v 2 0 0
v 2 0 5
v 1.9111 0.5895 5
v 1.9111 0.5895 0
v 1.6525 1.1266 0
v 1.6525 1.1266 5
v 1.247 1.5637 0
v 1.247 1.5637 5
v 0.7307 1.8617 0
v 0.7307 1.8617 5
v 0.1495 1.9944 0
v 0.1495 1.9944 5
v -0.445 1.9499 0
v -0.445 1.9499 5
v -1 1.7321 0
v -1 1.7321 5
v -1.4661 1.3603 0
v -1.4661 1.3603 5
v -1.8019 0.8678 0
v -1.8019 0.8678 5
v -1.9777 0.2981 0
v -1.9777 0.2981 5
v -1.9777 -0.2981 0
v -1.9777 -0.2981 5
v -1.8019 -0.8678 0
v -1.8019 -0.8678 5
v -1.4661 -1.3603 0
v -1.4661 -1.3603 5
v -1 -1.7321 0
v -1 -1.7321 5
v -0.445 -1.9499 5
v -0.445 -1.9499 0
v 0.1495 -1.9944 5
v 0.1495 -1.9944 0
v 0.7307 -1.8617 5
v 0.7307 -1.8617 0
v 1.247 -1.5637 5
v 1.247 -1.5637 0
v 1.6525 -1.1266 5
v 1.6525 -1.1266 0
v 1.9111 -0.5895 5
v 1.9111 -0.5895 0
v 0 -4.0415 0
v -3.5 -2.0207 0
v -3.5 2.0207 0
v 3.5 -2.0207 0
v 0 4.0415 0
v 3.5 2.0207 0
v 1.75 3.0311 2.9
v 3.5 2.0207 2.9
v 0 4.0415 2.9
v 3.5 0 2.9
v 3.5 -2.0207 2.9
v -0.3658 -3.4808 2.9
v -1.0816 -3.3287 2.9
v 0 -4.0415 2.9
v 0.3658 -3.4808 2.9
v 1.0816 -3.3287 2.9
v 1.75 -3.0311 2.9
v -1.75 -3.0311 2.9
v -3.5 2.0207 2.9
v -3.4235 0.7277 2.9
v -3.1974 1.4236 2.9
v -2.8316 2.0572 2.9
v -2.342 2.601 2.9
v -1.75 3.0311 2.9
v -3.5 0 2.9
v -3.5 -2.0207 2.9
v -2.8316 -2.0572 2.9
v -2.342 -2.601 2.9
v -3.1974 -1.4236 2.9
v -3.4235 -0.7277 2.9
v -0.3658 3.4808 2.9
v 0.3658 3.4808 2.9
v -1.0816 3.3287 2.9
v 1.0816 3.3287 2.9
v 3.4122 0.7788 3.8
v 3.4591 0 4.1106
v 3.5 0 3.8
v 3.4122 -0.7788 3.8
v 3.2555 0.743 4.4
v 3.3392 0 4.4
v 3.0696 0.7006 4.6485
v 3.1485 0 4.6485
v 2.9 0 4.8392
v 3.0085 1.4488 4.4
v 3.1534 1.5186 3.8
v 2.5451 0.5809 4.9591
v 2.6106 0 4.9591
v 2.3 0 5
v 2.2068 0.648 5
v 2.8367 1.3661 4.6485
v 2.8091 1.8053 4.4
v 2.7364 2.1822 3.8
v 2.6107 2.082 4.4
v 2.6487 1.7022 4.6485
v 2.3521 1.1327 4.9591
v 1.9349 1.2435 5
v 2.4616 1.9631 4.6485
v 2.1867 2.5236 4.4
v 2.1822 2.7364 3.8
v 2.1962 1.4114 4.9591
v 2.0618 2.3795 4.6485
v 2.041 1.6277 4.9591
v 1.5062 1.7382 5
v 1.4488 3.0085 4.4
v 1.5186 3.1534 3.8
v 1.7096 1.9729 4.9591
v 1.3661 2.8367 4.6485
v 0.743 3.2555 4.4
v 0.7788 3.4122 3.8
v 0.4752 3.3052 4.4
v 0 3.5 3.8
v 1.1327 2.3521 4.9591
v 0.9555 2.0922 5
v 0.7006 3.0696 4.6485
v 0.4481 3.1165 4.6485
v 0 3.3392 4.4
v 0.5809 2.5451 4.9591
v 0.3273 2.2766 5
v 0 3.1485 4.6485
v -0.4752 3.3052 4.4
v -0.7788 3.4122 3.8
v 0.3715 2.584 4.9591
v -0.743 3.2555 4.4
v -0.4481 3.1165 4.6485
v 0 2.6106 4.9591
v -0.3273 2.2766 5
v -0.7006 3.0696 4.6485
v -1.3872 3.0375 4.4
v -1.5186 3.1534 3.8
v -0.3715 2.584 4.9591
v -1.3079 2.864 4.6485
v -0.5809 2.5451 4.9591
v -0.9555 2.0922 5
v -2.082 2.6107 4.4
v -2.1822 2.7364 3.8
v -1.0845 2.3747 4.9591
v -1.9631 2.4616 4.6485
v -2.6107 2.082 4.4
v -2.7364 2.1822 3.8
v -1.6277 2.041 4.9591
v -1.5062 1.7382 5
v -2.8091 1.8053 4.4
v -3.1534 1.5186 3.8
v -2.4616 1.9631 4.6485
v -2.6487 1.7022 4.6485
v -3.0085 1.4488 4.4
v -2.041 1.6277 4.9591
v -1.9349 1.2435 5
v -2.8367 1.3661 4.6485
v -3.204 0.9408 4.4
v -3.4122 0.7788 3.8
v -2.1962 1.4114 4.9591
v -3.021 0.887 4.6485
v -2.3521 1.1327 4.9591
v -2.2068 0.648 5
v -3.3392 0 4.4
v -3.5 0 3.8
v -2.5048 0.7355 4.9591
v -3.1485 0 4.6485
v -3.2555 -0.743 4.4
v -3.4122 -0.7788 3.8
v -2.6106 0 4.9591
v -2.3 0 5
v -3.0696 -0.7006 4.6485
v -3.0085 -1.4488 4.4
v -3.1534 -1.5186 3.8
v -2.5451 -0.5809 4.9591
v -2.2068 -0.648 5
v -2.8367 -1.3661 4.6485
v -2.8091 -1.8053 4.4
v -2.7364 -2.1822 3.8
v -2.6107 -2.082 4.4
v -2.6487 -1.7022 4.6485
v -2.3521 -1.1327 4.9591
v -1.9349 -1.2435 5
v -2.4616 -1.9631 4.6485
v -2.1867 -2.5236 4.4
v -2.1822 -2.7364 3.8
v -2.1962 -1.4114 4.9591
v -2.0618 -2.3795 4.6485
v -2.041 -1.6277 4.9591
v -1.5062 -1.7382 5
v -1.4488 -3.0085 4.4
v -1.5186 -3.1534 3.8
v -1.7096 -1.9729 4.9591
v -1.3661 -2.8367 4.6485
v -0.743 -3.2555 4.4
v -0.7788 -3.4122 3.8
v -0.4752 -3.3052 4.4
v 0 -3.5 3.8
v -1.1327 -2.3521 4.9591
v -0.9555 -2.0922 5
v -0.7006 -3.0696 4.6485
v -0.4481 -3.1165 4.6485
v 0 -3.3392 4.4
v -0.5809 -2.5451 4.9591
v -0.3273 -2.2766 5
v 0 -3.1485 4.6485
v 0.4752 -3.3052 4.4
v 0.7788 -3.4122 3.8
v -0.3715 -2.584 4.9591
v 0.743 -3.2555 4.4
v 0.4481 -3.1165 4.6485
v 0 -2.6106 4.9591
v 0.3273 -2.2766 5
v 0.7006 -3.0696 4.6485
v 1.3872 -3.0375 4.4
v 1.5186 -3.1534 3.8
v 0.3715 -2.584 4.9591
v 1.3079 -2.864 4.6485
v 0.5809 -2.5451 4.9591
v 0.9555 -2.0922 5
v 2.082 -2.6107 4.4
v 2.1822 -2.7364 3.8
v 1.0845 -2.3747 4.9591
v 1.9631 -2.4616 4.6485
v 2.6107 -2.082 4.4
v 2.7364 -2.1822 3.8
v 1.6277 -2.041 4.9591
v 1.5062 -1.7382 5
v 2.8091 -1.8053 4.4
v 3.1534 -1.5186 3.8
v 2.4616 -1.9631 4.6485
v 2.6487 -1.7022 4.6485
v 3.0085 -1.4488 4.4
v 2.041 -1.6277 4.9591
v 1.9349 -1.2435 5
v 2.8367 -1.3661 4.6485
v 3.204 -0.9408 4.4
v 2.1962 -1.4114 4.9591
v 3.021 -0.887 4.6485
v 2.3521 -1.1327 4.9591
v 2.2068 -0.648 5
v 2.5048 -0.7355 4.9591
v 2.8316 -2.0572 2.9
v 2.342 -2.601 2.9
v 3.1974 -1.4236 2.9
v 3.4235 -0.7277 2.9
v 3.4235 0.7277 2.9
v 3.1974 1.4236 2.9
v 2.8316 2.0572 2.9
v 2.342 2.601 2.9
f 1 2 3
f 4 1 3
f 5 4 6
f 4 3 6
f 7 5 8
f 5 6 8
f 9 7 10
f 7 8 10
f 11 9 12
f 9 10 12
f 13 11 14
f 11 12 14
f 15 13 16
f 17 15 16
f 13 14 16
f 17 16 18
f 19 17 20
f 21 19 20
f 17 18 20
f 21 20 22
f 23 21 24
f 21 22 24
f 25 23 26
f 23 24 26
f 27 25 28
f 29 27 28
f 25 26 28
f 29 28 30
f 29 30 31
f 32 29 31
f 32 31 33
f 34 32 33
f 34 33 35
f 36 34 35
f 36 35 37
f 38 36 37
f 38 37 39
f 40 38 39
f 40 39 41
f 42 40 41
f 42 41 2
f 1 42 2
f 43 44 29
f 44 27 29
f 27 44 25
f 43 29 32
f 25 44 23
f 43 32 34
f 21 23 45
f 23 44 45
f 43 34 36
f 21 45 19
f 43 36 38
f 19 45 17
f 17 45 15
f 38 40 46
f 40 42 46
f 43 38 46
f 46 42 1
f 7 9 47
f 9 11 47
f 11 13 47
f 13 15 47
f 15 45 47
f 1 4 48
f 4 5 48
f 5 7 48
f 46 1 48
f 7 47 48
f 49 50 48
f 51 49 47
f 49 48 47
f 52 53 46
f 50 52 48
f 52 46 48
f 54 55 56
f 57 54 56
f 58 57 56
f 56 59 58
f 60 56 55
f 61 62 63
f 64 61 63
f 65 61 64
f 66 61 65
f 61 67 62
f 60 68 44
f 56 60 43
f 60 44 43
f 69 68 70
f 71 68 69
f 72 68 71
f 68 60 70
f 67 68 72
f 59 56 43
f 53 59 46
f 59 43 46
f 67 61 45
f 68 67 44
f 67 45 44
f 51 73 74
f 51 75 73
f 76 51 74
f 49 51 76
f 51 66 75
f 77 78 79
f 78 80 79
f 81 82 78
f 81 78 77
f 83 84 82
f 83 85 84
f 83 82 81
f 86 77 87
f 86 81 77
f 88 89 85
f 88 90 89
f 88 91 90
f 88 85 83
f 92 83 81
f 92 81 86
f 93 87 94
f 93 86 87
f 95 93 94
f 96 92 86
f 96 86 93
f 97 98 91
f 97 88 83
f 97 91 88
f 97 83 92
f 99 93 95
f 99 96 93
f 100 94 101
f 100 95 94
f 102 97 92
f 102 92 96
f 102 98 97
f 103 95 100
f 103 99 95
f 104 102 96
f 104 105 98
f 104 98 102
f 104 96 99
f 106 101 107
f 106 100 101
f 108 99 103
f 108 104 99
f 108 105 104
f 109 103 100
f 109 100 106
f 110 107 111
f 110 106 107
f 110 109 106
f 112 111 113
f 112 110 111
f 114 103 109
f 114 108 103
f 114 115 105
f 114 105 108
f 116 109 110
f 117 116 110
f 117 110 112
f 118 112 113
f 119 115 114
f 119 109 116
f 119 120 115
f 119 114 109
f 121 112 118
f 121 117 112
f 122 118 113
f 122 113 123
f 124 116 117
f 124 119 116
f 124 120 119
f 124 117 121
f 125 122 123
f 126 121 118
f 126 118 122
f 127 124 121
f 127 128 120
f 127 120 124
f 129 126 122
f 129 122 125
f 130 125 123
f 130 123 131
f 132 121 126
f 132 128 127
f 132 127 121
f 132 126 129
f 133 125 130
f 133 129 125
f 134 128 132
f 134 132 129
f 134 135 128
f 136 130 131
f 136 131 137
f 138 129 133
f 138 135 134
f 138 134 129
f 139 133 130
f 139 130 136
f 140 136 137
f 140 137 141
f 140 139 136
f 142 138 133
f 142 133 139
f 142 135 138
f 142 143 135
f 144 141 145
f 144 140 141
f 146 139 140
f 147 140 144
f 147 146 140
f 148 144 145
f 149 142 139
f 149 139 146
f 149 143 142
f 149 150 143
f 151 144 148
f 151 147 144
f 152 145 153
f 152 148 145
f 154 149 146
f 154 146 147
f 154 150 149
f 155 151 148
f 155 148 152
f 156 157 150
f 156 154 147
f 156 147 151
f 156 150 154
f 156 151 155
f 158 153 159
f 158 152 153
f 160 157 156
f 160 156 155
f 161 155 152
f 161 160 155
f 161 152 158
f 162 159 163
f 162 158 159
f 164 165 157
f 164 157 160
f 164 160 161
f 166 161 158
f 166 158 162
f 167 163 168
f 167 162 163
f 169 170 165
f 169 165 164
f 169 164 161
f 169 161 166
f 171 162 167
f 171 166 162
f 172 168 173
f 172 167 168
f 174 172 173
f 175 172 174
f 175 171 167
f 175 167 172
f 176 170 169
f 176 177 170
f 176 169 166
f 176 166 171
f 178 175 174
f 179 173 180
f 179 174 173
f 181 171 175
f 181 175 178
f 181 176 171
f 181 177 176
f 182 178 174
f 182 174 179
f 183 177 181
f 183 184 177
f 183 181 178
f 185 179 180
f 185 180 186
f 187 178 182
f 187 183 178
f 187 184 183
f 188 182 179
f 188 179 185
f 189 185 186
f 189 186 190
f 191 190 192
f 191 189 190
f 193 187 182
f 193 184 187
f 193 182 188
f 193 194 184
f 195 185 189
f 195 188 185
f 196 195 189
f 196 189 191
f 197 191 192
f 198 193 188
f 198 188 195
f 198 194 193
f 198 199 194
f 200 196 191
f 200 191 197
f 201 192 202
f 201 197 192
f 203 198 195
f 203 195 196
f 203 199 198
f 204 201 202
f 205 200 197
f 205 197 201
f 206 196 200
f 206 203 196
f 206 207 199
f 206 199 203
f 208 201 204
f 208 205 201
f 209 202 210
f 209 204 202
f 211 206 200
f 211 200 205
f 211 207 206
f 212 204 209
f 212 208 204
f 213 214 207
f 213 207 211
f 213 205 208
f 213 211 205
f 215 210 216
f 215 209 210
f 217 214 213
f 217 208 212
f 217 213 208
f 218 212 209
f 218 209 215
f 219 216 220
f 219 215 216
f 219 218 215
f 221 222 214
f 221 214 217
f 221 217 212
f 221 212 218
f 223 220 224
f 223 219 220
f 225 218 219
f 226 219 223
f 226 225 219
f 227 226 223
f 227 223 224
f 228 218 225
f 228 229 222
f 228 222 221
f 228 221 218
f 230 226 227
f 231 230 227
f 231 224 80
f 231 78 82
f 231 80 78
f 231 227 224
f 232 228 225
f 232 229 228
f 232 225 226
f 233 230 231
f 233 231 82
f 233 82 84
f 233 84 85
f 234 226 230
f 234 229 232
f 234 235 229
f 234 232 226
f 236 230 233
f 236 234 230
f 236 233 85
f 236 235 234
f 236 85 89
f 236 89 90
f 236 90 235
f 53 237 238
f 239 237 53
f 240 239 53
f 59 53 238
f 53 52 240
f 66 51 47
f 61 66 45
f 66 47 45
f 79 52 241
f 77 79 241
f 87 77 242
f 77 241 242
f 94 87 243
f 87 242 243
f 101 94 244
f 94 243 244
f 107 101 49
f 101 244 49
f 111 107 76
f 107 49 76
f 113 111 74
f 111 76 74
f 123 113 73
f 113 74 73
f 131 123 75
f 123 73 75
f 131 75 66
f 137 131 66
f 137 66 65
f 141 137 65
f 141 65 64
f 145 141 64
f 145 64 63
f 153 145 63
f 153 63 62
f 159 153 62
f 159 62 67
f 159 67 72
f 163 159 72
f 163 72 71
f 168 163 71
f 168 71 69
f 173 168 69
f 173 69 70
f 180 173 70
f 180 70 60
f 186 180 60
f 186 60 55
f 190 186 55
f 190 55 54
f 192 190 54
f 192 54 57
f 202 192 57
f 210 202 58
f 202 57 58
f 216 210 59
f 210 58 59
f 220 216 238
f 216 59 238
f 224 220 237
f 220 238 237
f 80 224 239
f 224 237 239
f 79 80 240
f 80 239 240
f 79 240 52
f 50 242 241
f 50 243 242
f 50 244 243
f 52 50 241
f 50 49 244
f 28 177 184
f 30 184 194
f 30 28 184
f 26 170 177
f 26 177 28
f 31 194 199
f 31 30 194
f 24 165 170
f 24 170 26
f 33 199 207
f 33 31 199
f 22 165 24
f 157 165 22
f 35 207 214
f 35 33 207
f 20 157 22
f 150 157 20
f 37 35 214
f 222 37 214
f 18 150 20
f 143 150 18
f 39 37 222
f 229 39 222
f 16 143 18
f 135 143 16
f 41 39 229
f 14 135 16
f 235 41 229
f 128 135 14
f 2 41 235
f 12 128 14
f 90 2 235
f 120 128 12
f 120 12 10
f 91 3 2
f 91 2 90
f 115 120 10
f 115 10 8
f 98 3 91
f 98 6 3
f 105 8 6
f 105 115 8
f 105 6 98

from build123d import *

# Parameters (mm, degrees)
EXTRUDE_1_DEPTH     = 2.9
SKETCH_2_R          = 3.5
EXTRUDE_2_DEPTH     = 2.1
SKETCH_3_R          = 2
CUT_EXTRUDE_1_DEPTH = 8.320063752
FILLET_1_R          = 1.2


with BuildPart() as part:
    # 草图1 → 凸台-拉伸1 (new body)
    with BuildSketch(Plane.XY):
        Polygon((3.5, -2.020725942), (3.5, 2.020725942), (0, 4.041451884), (-3.5, 2.020725942), (-3.5, -2.020725942), (0, -4.041451884), align=None)
    extrude(amount=EXTRUDE_1_DEPTH)

    # 草图2 → 凸台-拉伸2 (add)
    with BuildSketch(Plane.XY.offset(2.9)):
        Circle(SKETCH_2_R)
    extrude(amount=EXTRUDE_2_DEPTH)

    # 草图3 → 切除-拉伸1 (cut, through all)
    with BuildSketch(Plane.XY.offset(5)):
        Circle(SKETCH_3_R)
    extrude(amount=-CUT_EXTRUDE_1_DEPTH, mode=Mode.SUBTRACT)

    # 圆角1
    fillet_1_edges = [part.edges().sort_by_distance(p)[0] for p in [
        (-3.5, 0, 5),
    ]]
    fillet(fillet_1_edges, radius=FILLET_1_R)


solid = part.part
